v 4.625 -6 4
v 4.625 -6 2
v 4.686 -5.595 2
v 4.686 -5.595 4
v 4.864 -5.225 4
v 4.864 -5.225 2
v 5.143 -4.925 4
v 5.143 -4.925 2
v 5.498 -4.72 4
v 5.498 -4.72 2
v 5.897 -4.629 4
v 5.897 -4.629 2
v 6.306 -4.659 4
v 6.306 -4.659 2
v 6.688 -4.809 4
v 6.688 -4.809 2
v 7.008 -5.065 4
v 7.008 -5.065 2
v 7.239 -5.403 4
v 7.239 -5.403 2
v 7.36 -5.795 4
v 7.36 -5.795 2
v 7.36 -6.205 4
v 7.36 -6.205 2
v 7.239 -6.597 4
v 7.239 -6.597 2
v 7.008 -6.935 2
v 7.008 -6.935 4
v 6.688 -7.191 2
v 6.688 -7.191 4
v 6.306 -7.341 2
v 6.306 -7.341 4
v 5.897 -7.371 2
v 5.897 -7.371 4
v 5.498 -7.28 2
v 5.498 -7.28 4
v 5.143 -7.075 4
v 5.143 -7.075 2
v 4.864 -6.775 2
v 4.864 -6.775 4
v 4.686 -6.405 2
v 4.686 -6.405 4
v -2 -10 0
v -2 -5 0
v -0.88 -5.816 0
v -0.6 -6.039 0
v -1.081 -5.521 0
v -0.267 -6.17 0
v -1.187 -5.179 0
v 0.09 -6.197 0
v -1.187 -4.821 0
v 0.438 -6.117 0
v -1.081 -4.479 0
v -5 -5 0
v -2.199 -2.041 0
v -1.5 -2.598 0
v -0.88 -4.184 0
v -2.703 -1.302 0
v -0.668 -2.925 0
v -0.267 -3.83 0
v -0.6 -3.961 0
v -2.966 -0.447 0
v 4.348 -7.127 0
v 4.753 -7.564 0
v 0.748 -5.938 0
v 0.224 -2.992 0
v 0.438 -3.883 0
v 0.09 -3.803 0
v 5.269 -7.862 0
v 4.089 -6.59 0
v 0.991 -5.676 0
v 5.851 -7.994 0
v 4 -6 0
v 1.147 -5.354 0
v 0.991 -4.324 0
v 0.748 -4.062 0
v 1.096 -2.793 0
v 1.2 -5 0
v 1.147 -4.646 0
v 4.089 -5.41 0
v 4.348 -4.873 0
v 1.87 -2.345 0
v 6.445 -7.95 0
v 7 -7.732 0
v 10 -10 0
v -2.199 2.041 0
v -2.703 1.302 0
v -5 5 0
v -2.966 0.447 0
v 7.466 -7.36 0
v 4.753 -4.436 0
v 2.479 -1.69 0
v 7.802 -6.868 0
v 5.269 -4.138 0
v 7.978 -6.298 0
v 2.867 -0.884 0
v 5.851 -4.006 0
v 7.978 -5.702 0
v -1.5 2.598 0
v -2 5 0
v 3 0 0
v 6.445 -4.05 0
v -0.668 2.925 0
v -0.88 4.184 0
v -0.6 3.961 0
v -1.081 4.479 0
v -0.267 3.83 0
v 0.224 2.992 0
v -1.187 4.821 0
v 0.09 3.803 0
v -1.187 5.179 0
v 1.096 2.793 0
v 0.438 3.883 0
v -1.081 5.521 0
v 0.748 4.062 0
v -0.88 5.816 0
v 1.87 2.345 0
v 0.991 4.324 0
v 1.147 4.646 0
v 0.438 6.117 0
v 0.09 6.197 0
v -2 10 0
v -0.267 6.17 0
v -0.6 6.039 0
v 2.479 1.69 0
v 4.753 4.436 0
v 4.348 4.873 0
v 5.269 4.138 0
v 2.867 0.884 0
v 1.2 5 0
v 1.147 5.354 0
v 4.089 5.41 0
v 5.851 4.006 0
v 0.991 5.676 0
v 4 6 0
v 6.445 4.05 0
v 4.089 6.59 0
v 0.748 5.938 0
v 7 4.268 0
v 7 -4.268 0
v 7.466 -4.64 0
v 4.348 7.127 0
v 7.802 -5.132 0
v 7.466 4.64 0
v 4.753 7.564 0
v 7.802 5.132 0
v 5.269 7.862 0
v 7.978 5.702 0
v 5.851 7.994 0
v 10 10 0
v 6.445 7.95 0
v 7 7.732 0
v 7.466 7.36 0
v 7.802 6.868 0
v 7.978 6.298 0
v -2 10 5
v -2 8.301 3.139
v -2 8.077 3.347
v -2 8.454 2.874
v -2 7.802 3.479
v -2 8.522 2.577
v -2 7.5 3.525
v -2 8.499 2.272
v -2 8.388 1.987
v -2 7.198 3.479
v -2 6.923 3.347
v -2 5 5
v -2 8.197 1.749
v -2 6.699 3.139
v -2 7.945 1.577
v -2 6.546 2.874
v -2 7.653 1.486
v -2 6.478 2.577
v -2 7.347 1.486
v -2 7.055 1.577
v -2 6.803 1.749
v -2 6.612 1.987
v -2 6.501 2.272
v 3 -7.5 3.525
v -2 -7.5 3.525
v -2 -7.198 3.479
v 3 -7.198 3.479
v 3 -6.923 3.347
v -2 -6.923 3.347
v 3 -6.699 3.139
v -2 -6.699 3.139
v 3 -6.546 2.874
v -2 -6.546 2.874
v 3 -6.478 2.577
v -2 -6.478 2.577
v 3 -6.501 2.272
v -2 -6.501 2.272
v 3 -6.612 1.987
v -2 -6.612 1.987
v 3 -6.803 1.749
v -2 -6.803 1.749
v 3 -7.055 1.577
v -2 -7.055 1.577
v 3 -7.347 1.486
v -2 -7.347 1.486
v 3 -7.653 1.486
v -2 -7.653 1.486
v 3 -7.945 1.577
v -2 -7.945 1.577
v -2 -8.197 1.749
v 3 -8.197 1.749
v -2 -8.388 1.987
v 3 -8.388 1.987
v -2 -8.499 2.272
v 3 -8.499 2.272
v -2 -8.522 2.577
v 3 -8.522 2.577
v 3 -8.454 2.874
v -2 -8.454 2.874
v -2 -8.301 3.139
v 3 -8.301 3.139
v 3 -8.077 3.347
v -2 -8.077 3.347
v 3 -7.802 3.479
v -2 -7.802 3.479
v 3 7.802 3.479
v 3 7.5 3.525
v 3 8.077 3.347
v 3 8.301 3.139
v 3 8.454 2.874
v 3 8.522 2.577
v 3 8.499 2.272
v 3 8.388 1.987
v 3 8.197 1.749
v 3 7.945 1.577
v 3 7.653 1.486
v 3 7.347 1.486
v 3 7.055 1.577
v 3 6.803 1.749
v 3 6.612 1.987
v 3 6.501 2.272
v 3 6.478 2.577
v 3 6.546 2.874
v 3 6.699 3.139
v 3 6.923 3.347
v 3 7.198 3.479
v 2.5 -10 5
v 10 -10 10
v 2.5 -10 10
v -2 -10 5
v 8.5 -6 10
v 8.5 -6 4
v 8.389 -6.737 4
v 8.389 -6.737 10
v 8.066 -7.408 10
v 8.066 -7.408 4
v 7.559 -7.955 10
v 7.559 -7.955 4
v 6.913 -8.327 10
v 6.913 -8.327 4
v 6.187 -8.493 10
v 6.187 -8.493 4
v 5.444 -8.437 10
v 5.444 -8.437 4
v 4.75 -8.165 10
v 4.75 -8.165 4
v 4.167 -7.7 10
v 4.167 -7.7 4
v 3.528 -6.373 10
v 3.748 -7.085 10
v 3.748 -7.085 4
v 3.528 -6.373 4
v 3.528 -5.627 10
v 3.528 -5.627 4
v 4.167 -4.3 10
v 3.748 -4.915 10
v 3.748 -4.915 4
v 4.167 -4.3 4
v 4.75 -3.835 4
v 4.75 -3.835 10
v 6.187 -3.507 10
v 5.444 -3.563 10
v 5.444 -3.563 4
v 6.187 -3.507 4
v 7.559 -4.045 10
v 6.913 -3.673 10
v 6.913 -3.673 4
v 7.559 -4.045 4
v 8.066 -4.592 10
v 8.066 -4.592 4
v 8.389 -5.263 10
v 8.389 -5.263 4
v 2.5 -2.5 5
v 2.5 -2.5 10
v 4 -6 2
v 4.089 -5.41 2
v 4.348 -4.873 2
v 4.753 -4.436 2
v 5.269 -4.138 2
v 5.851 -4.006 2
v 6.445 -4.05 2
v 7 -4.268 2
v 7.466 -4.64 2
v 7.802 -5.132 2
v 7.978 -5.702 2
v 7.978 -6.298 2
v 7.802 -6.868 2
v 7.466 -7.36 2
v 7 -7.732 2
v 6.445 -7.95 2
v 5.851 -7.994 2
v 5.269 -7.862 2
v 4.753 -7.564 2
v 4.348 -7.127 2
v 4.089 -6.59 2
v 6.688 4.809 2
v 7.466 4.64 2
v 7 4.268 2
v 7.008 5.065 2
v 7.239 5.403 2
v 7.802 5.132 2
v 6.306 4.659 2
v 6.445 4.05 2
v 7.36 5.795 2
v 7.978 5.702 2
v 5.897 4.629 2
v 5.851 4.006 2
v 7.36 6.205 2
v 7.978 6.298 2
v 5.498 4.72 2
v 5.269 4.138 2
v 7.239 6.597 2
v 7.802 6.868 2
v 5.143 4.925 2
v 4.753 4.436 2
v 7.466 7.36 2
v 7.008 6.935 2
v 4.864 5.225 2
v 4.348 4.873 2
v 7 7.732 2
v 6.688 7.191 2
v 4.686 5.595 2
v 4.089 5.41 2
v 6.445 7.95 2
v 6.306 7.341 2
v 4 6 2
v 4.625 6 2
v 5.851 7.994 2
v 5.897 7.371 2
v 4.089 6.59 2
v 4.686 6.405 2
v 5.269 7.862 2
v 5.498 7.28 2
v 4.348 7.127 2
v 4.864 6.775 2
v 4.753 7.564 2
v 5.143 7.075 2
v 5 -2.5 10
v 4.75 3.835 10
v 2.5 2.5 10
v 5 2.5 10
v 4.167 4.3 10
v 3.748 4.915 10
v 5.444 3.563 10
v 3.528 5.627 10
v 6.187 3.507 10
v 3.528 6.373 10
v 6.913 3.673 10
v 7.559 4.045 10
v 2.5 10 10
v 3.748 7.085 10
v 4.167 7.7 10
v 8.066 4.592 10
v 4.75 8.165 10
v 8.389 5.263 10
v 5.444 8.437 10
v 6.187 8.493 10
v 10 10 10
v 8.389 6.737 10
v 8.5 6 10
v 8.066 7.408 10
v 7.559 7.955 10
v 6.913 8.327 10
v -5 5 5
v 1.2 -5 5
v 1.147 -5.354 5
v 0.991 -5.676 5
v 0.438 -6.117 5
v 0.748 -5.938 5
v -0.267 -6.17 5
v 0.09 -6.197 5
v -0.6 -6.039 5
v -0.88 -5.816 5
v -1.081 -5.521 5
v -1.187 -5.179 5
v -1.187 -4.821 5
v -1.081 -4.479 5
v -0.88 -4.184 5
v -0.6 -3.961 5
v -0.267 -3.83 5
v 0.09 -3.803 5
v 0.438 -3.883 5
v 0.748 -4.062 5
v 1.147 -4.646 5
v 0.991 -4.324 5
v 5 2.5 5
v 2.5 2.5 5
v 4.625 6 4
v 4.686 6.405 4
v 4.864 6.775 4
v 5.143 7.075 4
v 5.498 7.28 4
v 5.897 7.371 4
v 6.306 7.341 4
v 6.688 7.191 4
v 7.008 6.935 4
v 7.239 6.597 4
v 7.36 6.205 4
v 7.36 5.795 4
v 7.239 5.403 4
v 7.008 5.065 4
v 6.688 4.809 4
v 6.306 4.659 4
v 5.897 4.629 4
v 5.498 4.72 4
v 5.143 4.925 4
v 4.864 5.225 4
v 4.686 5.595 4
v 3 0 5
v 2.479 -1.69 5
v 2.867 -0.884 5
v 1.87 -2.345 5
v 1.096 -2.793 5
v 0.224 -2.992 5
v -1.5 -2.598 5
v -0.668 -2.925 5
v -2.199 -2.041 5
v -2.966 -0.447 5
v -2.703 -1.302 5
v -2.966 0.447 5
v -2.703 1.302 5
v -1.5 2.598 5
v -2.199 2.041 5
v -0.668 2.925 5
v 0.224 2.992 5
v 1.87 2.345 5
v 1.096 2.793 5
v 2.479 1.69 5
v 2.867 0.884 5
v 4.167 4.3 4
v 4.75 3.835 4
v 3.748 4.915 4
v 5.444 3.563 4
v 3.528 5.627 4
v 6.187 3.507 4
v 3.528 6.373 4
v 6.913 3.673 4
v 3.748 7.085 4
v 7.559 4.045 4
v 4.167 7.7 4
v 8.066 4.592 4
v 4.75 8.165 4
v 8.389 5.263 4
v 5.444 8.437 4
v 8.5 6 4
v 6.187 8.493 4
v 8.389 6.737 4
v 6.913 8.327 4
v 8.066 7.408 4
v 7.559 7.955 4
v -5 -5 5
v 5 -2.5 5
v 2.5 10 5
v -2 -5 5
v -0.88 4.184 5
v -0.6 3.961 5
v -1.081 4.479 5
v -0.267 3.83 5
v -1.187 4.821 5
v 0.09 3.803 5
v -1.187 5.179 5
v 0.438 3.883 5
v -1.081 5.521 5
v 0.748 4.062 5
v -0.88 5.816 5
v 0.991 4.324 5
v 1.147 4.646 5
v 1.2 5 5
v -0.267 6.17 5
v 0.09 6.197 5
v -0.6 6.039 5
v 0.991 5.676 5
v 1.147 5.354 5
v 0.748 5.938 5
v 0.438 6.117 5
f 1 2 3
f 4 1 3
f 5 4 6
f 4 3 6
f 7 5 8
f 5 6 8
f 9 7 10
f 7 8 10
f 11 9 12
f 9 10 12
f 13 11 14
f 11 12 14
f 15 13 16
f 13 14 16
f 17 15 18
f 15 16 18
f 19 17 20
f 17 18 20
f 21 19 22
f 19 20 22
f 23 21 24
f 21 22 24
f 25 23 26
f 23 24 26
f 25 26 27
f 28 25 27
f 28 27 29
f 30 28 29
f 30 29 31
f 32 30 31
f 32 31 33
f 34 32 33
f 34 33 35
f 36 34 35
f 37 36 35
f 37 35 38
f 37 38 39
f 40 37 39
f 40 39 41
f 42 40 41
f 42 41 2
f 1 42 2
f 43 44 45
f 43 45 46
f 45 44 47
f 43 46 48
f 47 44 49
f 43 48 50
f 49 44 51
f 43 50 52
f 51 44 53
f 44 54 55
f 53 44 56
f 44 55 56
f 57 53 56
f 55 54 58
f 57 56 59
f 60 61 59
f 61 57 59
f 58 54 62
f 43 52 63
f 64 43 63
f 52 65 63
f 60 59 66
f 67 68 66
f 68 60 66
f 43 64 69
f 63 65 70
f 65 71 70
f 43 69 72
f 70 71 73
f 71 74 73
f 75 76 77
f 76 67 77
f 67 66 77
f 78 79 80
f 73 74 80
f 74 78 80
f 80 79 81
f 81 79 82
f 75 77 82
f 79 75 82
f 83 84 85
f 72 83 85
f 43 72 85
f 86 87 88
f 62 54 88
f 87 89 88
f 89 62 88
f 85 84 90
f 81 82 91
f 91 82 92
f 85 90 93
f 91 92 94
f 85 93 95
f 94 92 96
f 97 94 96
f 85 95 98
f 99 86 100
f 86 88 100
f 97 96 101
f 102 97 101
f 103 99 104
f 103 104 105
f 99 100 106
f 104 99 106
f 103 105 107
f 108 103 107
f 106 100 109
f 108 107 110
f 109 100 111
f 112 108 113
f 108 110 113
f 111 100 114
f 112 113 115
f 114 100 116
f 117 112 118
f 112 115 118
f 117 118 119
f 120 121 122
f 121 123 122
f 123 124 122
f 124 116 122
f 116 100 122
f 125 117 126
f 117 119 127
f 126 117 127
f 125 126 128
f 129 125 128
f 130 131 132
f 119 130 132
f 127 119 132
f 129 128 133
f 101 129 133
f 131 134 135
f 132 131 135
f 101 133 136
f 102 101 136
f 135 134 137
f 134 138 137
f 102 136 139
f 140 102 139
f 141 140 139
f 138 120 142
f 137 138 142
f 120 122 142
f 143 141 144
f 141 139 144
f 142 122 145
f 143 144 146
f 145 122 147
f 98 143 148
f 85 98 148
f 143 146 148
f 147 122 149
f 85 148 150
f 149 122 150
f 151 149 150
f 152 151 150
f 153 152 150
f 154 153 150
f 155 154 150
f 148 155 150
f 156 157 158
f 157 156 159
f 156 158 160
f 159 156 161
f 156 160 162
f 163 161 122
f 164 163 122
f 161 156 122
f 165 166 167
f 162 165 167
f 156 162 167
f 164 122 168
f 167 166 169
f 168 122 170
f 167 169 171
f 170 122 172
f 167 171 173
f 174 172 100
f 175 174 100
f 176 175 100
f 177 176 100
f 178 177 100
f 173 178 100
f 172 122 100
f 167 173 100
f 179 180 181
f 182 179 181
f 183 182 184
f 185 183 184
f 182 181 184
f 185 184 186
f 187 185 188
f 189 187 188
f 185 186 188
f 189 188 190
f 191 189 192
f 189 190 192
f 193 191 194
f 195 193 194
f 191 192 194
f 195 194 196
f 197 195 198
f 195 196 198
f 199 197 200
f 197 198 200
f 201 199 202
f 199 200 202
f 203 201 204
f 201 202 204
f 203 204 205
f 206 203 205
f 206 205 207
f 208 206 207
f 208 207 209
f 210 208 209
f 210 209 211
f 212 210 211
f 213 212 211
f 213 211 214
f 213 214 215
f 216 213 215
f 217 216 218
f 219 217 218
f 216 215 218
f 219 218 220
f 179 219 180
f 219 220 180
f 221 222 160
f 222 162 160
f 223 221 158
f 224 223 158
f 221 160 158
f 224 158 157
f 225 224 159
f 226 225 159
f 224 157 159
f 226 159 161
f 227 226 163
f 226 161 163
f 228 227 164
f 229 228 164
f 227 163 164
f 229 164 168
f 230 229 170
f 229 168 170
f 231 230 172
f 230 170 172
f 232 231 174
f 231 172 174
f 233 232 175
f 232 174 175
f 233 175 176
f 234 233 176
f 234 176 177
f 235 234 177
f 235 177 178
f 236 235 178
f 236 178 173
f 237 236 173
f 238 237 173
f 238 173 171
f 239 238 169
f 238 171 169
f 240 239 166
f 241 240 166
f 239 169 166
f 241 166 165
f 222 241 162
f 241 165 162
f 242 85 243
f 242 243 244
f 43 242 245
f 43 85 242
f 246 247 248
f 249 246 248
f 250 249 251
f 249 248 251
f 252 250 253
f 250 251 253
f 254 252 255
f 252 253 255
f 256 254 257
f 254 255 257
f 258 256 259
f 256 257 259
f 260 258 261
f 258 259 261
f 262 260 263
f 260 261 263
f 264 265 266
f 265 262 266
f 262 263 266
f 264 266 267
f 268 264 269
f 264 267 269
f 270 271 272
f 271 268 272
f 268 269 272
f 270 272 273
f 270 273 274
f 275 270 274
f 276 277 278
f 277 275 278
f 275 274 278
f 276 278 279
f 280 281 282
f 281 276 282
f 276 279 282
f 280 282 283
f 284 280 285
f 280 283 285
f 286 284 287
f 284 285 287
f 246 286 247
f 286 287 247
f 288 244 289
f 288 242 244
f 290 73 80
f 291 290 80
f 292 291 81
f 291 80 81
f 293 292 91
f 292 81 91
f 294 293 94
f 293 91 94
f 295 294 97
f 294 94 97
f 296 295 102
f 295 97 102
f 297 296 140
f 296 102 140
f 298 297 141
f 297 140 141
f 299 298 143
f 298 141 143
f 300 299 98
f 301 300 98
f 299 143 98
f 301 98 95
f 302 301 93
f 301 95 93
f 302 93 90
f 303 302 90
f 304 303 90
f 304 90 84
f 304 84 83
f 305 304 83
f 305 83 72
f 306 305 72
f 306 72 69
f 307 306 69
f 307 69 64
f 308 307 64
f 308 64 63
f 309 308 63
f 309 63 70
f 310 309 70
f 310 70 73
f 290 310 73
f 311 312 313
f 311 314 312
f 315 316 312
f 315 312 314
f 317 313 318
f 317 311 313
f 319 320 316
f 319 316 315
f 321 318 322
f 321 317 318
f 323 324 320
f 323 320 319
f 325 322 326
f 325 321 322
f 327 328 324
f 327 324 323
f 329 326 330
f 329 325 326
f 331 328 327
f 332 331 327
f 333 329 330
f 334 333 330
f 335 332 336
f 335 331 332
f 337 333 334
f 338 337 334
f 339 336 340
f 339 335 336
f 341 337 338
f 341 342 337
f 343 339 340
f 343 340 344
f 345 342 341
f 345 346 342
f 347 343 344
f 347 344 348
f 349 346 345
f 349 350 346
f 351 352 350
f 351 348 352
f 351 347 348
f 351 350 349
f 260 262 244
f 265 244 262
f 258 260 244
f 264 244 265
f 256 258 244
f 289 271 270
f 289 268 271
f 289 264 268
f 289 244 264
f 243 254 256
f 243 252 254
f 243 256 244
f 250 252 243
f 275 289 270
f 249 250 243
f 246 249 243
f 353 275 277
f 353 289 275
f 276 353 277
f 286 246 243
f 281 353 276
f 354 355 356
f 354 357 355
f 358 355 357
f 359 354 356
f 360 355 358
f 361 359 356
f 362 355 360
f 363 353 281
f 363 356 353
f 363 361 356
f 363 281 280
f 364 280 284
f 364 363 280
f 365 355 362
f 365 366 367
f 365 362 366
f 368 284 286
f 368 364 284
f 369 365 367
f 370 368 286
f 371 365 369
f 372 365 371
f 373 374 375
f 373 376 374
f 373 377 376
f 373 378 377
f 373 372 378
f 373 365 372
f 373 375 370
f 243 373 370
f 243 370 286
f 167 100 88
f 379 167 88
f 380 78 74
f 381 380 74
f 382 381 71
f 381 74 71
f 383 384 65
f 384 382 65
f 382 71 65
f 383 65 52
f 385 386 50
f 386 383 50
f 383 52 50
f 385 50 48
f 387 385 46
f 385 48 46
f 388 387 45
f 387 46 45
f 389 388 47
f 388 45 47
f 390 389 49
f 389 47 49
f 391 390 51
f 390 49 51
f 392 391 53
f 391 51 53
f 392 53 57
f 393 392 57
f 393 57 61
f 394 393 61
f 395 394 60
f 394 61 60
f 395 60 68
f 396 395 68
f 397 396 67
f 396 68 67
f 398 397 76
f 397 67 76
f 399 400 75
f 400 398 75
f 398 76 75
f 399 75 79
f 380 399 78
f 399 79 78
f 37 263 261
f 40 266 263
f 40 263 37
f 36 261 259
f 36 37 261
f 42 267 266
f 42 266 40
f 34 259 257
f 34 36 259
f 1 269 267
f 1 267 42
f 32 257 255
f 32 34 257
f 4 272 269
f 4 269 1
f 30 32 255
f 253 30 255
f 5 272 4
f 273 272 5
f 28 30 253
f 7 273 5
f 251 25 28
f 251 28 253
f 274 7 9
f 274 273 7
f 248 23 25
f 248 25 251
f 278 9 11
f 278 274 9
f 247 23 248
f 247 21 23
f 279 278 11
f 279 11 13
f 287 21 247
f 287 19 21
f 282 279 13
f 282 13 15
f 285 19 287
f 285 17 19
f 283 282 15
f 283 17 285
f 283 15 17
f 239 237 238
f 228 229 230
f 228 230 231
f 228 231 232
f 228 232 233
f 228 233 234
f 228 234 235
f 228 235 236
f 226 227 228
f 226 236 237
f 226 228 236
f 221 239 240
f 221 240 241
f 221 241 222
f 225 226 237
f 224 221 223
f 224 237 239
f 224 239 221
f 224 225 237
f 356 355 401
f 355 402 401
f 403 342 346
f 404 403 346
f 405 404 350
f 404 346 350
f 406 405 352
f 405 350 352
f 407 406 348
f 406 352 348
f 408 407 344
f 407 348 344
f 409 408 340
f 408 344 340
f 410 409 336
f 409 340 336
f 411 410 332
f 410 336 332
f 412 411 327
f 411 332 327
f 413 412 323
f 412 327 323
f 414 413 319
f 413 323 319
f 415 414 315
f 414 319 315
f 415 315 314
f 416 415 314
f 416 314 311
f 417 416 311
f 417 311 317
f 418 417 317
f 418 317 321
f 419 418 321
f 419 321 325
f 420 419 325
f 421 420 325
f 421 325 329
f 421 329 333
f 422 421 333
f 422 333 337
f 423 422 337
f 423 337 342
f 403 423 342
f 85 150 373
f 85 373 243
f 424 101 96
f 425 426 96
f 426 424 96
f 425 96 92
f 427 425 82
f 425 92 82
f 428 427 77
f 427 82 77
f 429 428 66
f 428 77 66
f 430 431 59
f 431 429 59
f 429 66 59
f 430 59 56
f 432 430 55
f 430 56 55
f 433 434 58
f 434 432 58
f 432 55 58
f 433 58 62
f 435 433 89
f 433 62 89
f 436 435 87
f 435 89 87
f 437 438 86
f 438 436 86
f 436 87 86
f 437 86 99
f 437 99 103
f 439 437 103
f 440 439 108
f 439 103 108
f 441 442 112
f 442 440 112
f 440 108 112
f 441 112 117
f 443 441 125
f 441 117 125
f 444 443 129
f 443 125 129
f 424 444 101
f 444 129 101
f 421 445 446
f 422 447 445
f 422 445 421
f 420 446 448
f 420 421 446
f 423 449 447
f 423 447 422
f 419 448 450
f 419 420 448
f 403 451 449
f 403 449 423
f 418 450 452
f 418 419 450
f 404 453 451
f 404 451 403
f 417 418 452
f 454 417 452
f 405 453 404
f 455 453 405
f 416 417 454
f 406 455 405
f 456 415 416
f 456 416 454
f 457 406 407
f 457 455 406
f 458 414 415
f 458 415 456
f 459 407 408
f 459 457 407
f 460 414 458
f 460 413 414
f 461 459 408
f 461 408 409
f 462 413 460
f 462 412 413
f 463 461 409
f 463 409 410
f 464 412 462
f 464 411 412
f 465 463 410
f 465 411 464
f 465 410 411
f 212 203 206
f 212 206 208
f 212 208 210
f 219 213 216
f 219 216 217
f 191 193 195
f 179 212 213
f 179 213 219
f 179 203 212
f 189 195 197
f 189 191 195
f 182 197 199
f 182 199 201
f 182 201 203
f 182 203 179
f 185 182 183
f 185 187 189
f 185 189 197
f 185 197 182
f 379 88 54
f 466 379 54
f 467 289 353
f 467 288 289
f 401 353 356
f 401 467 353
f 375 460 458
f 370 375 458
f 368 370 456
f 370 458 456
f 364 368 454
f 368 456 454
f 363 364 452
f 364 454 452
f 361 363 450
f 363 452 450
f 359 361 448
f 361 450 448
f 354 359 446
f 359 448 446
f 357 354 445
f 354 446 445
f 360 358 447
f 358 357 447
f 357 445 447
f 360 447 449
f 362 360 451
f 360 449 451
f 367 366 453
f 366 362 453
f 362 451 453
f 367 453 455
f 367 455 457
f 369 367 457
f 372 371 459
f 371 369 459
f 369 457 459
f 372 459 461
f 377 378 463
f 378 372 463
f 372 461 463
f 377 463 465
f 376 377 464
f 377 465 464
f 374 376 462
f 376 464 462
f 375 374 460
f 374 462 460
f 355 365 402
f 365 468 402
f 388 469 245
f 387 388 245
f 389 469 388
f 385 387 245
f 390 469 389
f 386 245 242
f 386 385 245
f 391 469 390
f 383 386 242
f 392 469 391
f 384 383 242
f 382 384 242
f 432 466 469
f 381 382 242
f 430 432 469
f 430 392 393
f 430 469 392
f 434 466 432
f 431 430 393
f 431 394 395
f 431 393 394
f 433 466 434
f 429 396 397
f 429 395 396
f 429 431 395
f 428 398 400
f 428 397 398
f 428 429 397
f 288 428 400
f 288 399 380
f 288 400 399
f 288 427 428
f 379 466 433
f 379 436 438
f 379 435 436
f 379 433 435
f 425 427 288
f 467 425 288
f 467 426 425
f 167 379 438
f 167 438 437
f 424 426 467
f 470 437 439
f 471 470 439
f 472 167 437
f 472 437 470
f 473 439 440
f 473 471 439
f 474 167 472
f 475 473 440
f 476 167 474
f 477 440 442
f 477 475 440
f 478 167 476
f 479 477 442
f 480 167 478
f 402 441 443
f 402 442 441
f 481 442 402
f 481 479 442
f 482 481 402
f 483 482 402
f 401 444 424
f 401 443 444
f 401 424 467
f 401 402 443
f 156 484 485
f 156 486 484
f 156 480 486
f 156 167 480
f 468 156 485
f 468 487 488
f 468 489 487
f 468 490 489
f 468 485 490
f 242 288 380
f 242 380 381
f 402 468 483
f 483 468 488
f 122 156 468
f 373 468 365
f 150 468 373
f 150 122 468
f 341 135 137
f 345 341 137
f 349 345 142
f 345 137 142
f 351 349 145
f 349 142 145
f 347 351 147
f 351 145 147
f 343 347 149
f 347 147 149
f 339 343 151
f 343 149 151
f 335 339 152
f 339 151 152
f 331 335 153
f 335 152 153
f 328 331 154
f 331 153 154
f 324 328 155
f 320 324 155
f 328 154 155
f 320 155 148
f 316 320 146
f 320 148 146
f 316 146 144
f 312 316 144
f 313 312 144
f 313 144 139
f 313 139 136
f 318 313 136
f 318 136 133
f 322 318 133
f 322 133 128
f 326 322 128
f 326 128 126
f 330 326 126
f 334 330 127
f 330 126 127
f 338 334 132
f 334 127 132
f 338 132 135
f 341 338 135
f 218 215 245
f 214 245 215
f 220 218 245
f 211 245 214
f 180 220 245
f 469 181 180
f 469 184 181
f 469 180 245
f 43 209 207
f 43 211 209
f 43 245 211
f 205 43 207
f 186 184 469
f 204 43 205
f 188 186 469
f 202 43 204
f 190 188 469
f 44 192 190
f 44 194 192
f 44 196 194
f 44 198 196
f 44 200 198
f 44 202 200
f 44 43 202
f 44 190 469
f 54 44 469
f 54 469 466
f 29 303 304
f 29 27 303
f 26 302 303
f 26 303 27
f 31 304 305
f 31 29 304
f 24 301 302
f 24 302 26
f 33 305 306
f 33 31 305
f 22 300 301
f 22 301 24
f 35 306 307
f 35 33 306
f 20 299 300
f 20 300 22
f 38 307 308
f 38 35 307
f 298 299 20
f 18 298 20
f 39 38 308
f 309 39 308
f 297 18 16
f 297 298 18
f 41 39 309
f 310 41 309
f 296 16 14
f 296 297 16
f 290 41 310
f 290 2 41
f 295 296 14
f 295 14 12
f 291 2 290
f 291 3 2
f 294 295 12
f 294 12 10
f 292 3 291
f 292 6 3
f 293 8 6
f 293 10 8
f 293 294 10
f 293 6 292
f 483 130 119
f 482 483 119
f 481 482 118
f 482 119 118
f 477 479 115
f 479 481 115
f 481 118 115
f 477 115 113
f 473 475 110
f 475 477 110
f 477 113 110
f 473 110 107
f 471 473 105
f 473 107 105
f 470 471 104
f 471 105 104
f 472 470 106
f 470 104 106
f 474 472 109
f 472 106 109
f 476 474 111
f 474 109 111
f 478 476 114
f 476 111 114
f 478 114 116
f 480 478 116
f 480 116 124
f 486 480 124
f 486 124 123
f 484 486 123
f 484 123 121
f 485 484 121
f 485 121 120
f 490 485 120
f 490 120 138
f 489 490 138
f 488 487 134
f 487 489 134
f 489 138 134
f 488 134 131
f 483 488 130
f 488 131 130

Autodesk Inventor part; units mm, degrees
ref_plane "YZ Plane" through (0, 0, 0) normal (1, 0, 0) x (0, 1, 0)
ref_plane "XZ Plane" through (0, 0, 0) normal (0, 1, 0) x (-1, 0, 0)
ref_plane "XY Plane" through (0, 0, 0) normal (0, 0, 1) x (1, 0, 0)
sketch "Sketch1" plane through (0, 0, 0) normal (0, 0, 1) x (1, 0, 0)
  line L0 (10, -10) -> (-10, -10)
  line L1 (-10, -10) -> (-10, 10)
  line L2 (-10, 10) -> (10, 10)
  line L3 (10, 10) -> (10, -10)
  circle A0 centre (0, 5) radius 1.2
  circle A1 centre (0, -5) radius 1.2
  circle A2 centre (0, 0) radius 3
  dimension "d0" = 10
  dimension "d1" = 10
  dimension "d2" = 10
  dimension "d3" = 10
  dimension "d4" = 5
  dimension "d5" = 5
  dimension "d6" = 2.4
  dimension "d7" = 2.4
  dimension "d8" = 6
extrude "Extrusion1" add sketch "Sketch1" along normal blind 5
sketch "Sketch2" plane through (0, 0, 5) normal (0, 0, 1) x (1, 0, 0)
  line L0 (0, 0) -> (-1.3346, -1.3533)
  circle A0 centre (6, -6) radius 2.5
  circle A1 centre (6, 6) radius 2.5
  line L1 (10, -10) -> (10, 10) projected
  line L2 (-10, -10) -> (10, -10) projected
  line L3 (10, 10) -> (-10, 10) projected
  dimension "d34" = 4
  dimension "d35" = 4
  dimension "d36" = 4
  dimension "d37" = 4
  dimension "d38" = 5
  dimension "d39" = 5
extrude "Extrusion2" cut sketch "Sketch2" against normal blind 1
sketch "Sketch7" plane through (0, 0, 0) normal (0, 0, -1) x (-1, 0, 0)
  circle A0 centre (-6, 6) radius 2.5 projected
  circle A1 centre (-6, 6) radius 1.375
  circle A2 centre (-6, -6) radius 2.5 projected
  circle A3 centre (-6, -6) radius 1.375
  point P0 (0, 0)
  dimension "d40" = 2.75
  dimension "d41" = 2.75
extrude "Extrusion6" cut sketch "Sketch7" against normal blind 5 contours A1 | A3
sketch "Sketch8" plane through (0, 0, 5) normal (0, 0, 1) x (1, 0, 0)
  line L0 (10, 10) -> (-10, 10) projected
  line L1 (10, 10) -> (2.5, 10)
  line L2 (2.5, 10) -> (2.5, 2.5)
  line L3 (2.5, 2.5) -> (10, 2.5)
  line L4 (10, 2.5) -> (10, 10)
  line L5 (10, -10) -> (10, 10) projected
  line L6 (10, -10) -> (2.5, -10)
  line L7 (2.5, -10) -> (2.5, -2.5)
  line L8 (2.5, -2.5) -> (10, -2.5)
  line L9 (10, -2.5) -> (10, -10)
  line L10 (10, -2.5) -> (5, -2.5)
  line L11 (5, -2.5) -> (5, 2.5)
  line L12 (5, 2.5) -> (10, 2.5)
  line L13 (10, 2.5) -> (10, -2.5)
  circle A0 centre (6, 6) radius 2.5 projected
  circle A1 centre (6, 6) radius 2.5
  circle A2 centre (6, -6) radius 2.5 projected
  circle A3 centre (6, -6) radius 2.5
  point P0 (0, 0)
  point P1 (2.5, 10)
  dimension "d44" = 7.5
  dimension "d45" = 7.5
  dimension "d46" = 7.5
  dimension "d47" = 7.5
  dimension "d48" = 5
extrude "Extrusion7" add sketch "Sketch8" along normal blind 5
sketch "Sketch9" plane through (0, 0, 0) normal (0, 0, -1) x (-1, 0, 0)
  circle A0 centre (-6, 6) radius 1.375 projected
  circle A1 centre (-6, 6) radius 2
  circle A2 centre (-6, -6) radius 1.375 projected
  circle A3 centre (-6, -6) radius 2
  point P0 (0, 0)
  dimension "d51" = 4
  dimension "d52" = 4
extrude "Extrusion8" cut sketch "Sketch9" against normal blind 2 contours A0 | A1 | A2 | A3
sketch "Sketch10" plane through (0, 0, 0) normal (0, 0, -1) x (-1, 0, 0)
  line L0 (-2.5, 10) -> (10, 10) projected
  line L1 (10, -10) -> (-2.5, -10) projected
  line L2 (10, 10) -> (5, 10)
  line L3 (5, 10) -> (5, -10)
  line L4 (5, -10) -> (10, -10)
  line L5 (10, -10) -> (10, 10)
  line L6 (5, 10) -> (2, 10)
  line L7 (2, 10) -> (2, 5)
  line L8 (2, 5) -> (5, 5)
  line L9 (5, 5) -> (5, 10)
  line L10 (5, -10) -> (2, -10)
  line L11 (2, -10) -> (2, -5)
  line L12 (2, -5) -> (5, -5)
  line L13 (5, -5) -> (5, -10)
  point P0 (0, 0)
  dimension "d55" = 5
  dimension "d56" = 3
  dimension "d57" = 5
  dimension "d58" = 5
  dimension "d59" = 3
extrude "Extrusion9" cut sketch "Sketch10" against normal blind 10
sketch "Sketch11" plane through (-2, 5, 0) normal (-1, 0, 0) x (0, 0, 1)
  circle A0 centre (2.5, 2.5) radius 1.025
  line L0 (0, 5) -> (5, 5) projected
  line L1 (0, 0) -> (0, 5) projected
  circle A1 centre (2.5, -12.5) radius 1.025
  line L2 (5, -15) -> (0, -15) projected
  line L3 (0, -15) -> (0, -10) projected
  point P0 (0, -5)
  dimension "d62" = 2.5
  dimension "d63" = 2.5
  dimension "d64" = 2.05
  dimension "d65" = 2.5
  dimension "d66" = 2.5
  dimension "d67" = 2.05
extrude "Extrusion10" cut sketch "Sketch11" against normal blind 5
thread "Thread1" size "M2.5x0.45" class "6H" standard "ANSI Metric M Profile" length 5
thread "Thread2" size "M2.5x0.45" class "6H" standard "ANSI Metric M Profile" length 5
equation "\"d1\" = d0"
equation "\"d2\" = d0"
equation "\"d3\" = d2"
equation "\"d5\" = d4"
equation "\"d7\" = d6"
equation "\"d39\" = d38"
equation "\"d45\" = d44"
equation "\"d46\" = d45"
equation "\"d52\" = d51"
equation "\"d65\" = d62"
equation "\"d66\" = d63"
equation "\"d67\" = d64"
properties part number "MotorMount"
